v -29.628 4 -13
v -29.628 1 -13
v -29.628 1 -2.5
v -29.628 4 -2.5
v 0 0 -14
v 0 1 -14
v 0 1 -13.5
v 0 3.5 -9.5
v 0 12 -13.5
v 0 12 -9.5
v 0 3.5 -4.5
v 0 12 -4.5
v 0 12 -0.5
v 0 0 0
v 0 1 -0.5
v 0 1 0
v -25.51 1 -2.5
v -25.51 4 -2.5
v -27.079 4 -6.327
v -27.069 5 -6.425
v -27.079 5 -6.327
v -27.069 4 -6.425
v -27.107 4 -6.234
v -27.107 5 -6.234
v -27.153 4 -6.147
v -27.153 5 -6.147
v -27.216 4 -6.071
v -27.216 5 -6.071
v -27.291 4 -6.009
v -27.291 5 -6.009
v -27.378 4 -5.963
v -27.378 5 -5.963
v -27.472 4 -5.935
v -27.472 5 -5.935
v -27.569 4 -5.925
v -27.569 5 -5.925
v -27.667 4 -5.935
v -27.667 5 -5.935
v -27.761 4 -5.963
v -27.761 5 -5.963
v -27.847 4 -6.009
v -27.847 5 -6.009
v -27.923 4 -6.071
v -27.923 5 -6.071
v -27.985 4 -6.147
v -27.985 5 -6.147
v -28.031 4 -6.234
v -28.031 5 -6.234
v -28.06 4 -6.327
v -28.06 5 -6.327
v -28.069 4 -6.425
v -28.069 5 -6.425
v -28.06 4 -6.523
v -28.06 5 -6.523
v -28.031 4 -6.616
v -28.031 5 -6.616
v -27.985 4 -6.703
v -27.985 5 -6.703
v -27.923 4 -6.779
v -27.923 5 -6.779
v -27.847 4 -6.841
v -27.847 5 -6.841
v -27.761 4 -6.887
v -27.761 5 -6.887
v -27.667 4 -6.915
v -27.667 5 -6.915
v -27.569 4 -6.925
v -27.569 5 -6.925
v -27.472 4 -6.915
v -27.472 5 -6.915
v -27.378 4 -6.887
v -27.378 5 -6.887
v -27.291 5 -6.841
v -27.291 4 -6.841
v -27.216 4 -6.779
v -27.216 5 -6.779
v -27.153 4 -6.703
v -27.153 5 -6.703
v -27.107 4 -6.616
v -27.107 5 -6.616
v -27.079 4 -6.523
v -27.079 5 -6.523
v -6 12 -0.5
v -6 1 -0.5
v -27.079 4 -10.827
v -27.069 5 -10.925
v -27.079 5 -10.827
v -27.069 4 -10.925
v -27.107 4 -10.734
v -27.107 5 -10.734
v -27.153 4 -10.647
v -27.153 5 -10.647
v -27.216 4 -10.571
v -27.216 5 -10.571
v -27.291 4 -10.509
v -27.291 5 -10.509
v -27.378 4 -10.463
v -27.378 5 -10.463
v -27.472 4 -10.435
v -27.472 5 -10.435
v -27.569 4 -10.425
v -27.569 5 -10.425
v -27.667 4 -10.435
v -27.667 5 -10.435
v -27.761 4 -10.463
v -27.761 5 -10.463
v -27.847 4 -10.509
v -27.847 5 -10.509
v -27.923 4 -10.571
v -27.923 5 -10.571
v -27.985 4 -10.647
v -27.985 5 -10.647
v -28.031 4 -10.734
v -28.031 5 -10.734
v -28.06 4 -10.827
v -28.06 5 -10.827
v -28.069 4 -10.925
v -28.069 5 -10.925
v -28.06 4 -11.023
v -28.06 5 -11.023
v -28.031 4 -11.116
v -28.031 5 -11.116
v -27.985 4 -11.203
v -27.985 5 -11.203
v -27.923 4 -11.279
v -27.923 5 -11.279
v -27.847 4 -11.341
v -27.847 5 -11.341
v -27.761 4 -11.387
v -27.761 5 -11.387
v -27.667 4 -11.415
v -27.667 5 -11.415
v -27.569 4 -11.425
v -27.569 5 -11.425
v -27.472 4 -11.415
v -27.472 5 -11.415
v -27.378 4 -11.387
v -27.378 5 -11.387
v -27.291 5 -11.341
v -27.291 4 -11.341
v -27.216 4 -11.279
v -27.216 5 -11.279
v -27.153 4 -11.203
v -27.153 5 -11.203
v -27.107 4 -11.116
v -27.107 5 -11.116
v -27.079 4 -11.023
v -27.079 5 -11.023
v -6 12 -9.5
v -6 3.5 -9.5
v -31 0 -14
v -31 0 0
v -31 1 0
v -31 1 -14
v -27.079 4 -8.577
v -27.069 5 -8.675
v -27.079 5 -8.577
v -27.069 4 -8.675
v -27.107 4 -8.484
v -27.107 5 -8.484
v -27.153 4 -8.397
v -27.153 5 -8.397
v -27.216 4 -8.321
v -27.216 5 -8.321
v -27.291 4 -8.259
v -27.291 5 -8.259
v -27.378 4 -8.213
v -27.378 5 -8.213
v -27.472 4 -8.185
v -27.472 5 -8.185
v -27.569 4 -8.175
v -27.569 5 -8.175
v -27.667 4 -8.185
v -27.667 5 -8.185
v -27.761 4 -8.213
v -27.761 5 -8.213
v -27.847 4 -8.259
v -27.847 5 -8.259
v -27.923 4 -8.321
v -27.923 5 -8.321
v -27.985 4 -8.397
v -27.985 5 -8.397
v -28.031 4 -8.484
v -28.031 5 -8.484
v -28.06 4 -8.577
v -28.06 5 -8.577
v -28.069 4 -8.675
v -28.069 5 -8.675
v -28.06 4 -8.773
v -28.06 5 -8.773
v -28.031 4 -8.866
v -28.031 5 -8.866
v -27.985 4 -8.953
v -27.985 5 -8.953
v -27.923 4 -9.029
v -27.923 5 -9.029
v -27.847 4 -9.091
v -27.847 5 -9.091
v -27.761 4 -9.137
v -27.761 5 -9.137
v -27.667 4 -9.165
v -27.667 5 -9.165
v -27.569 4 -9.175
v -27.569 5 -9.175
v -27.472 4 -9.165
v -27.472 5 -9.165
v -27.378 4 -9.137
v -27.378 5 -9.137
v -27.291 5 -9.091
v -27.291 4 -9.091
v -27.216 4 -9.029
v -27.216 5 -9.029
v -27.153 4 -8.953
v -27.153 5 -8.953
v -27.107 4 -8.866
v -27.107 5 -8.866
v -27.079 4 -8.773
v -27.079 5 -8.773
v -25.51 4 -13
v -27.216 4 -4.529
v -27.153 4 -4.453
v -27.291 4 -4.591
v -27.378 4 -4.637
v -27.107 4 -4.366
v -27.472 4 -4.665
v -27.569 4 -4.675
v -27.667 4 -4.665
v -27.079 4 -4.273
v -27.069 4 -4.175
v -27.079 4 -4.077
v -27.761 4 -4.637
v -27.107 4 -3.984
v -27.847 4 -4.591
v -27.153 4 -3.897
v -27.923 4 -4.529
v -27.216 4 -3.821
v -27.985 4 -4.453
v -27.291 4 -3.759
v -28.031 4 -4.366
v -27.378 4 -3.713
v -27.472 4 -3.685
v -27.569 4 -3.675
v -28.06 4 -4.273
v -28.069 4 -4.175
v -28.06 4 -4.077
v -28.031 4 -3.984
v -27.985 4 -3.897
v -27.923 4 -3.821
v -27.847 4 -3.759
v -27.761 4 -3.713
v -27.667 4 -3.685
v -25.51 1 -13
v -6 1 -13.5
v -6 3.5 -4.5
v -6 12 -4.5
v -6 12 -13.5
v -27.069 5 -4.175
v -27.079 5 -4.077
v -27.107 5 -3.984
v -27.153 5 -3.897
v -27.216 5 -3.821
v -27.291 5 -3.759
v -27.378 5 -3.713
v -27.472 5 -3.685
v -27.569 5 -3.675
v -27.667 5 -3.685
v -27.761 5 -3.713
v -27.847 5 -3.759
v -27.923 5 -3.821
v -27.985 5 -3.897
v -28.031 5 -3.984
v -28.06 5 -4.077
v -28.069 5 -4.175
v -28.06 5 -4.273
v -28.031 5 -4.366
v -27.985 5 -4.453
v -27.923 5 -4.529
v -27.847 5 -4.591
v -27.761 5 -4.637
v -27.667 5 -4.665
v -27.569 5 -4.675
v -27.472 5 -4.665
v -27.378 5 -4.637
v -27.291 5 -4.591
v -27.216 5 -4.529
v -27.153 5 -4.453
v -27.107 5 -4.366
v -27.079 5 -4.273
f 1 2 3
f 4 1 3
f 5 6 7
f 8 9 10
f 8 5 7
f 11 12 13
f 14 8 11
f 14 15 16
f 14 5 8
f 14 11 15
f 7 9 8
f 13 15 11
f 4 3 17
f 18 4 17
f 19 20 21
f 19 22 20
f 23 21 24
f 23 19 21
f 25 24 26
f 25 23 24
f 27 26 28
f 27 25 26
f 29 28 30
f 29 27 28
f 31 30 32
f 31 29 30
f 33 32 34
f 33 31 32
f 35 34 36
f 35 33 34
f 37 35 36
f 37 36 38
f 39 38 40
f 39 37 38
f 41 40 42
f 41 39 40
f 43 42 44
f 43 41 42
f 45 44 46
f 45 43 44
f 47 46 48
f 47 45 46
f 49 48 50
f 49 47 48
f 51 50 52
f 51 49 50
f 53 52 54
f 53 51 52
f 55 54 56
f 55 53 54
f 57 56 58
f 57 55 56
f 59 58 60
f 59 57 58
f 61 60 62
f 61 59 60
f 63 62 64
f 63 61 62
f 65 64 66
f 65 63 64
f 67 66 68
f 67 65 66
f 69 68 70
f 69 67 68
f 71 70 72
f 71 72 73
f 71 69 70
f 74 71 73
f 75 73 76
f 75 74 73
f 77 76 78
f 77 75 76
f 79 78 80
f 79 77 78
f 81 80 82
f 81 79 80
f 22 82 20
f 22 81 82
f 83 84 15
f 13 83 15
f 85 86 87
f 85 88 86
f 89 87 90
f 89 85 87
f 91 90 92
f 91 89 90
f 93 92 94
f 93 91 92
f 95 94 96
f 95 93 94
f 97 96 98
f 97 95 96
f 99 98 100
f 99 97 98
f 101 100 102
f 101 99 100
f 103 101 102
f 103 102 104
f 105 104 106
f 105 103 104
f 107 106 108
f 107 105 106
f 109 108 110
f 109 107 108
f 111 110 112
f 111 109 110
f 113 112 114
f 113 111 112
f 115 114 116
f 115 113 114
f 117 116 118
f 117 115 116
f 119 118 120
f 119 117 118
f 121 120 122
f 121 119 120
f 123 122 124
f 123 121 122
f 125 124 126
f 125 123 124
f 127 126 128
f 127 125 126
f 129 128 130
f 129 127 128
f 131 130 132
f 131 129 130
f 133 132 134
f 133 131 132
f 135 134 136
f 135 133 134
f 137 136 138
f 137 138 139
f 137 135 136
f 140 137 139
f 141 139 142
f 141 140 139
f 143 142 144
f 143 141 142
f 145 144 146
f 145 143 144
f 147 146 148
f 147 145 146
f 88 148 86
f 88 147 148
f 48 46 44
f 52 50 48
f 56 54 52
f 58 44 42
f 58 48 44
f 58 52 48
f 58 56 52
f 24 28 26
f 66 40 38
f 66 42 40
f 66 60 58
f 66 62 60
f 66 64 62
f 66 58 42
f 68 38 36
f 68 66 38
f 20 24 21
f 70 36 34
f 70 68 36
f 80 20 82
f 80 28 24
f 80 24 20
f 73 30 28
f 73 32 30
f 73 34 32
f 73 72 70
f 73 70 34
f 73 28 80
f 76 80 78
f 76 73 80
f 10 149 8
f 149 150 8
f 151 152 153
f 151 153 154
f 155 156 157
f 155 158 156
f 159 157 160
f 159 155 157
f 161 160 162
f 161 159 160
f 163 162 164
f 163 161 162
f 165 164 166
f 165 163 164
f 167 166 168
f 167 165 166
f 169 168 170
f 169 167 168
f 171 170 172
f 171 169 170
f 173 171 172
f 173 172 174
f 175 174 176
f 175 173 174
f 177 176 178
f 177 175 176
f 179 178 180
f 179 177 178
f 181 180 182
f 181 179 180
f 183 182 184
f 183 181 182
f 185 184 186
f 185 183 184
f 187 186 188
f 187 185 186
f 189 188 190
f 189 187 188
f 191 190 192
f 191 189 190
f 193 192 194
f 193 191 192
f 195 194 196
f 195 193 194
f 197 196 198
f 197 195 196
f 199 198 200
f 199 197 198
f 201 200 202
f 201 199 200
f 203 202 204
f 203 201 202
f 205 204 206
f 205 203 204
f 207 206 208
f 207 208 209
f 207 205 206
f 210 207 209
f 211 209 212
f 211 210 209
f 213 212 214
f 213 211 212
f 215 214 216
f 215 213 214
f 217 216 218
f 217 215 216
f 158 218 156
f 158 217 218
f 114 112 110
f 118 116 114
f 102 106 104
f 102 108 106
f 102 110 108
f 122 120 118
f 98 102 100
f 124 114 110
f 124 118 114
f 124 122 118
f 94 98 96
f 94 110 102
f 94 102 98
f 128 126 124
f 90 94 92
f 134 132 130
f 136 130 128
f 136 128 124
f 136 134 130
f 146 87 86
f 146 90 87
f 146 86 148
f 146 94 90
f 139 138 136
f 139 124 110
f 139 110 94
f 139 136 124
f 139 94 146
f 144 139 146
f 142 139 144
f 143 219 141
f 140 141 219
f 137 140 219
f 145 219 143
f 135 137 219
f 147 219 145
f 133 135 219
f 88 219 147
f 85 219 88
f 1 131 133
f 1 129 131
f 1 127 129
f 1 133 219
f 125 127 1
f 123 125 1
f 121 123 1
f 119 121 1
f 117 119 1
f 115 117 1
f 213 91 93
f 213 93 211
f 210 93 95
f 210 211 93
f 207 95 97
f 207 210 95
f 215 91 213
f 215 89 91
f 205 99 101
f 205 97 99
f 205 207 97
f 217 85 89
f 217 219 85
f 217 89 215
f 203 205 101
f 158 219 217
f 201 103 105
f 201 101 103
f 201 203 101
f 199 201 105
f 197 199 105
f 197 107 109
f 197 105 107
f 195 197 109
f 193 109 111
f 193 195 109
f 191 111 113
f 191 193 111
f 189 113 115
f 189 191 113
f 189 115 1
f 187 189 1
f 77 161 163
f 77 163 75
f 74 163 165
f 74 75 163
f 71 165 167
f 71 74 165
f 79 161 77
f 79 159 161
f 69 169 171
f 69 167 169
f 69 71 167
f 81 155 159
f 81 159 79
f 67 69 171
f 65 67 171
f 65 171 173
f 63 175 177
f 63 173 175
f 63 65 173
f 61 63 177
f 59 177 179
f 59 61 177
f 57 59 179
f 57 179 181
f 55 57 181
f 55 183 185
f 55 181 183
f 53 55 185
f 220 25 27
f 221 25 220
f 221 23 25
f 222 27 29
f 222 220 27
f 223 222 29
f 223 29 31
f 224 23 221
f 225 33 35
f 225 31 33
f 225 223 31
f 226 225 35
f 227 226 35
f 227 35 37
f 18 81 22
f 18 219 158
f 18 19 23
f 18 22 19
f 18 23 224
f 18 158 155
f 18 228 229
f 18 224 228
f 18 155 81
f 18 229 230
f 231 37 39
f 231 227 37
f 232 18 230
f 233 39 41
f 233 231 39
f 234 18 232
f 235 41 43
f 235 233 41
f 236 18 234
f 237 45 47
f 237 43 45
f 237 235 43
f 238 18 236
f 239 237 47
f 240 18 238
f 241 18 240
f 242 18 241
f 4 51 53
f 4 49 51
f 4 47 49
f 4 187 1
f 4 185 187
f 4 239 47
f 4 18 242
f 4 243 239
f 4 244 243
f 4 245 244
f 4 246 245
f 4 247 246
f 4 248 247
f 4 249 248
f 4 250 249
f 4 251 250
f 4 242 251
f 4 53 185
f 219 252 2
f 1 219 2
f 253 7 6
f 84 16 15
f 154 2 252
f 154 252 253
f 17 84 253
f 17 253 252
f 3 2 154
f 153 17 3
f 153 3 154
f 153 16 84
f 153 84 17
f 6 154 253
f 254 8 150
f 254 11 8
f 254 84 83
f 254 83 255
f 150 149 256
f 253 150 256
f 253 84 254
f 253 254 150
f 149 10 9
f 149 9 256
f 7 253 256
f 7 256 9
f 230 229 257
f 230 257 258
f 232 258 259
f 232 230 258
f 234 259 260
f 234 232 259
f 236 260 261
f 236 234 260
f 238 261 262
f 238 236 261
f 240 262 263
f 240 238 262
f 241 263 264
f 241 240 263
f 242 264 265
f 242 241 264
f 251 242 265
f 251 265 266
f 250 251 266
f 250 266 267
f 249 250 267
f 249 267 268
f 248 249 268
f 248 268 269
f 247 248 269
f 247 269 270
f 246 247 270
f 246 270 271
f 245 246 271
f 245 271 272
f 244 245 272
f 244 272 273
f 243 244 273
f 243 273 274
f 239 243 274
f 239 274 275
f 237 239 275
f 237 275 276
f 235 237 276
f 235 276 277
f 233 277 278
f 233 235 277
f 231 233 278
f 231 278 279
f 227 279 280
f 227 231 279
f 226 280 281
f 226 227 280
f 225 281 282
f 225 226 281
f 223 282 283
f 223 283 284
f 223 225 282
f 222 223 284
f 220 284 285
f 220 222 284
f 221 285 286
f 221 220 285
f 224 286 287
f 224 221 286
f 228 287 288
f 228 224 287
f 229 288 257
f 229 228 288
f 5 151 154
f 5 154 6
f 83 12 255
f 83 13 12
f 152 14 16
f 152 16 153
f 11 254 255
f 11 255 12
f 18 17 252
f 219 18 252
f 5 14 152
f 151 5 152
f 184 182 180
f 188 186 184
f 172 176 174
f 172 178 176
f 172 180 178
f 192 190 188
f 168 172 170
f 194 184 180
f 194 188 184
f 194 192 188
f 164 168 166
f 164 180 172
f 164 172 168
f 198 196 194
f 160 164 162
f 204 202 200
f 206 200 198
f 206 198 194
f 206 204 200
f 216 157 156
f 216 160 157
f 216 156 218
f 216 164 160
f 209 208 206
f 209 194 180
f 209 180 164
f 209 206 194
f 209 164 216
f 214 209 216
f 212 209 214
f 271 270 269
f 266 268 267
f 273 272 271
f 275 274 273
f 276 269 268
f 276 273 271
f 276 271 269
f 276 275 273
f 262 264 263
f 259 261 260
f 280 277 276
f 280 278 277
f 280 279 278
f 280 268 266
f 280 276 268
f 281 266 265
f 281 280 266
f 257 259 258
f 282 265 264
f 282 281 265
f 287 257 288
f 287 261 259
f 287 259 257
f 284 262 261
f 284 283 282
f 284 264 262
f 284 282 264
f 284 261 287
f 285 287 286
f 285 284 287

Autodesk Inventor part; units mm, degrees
ref_plane "YZ Plane" through (0, 0, 0) normal (1, 0, 0) x (0, 1, 0)
ref_plane "XZ Plane" through (0, 0, 0) normal (0, 1, 0) x (-1, 0, 0)
ref_plane "XY Plane" through (0, 0, 0) normal (0, 0, 1) x (1, 0, 0)
sketch "草圖1" plane through (0, 0, 0) normal (0, 1, 0) x (-1, 0, 0)
  line L0 (0, 0) -> (31, 0)
  line L1 (31, 0) -> (31, -14)
  line L2 (31, -14) -> (0, -14)
  line L3 (0, -14) -> (0, 0)
  line L4 (6, 0) -> (6, -14)
  line L5 (6, -0.5) -> (0, -0.5)
  line L6 (6, -4.5) -> (0, -4.5)
  line L7 (6, -13.5) -> (0, -13.5)
  line L8 (6, -9.5) -> (0, -9.5)
  line L9 (29.6283, -2.5) -> (25.5101, -2.5)
  line L10 (25.5101, -2.5) -> (25.5101, -13)
  line L11 (25.5101, -13) -> (29.6283, -13)
  line L12 (29.6283, -13) -> (29.6283, -2.5)
  dimension "d0" = 31
  dimension "d1" = 14
  dimension "d2" = 6
  dimension "d3" = 0.5
  dimension "d4" = 4
  dimension "d5" = 4
  dimension "d6" = 0.5
  dimension "d7" = 1
  dimension "d8" = 2.5
extrude "擠出1" add sketch "草圖1" along normal blind 1 contours L0 L4 L5 L3 | L0 L1 L2 L4 | L5 L4 L6 L3 | L6 L4 L8 L3 | L8 L4 L7 L3 | L2 L3 L7 L4 | L12 L11 L10 L9
extrude "擠出2" add sketch "草圖1" along normal blind 12 contours L5 L4 L6 L3 | L8 L4 L7 L3
extrude "擠出3" add sketch "草圖1" along normal blind 4 contours L12 L11 L10 L9
sketch "草圖2" plane through (0, 4, 0) normal (0, 1, 0) x (1, 0, 0)
  circle A0 centre (-27.5692, 4.175) radius 0.5
  line L0 (-29.6283, 2.5) -> (-25.5101, 2.5) projected
  line L1 (-27.5692, 4.175) -> (-27.5692, 13)
  line L2 (-29.6283, 13) -> (-25.5101, 13) projected
  circle A1 centre (-27.5692, 6.425) radius 0.5
  circle A2 centre (-27.5692, 8.675) radius 0.5
  circle A3 centre (-27.5692, 10.925) radius 0.5
  point P0 (0, 0)
  point P1 (-27.5692, 2.5)
  dimension "d15" = 1
  dimension "d16" = 1.675
  dimension "d19" = 2.25
extrude "擠出4" add sketch "草圖2" along normal blind 1
extrude "擠出5" add sketch "草圖1" along normal blind 3.5 contours L6 L4 L8 L3
properties part number "LM393" material "MDF Medium Density Fiberboard"
